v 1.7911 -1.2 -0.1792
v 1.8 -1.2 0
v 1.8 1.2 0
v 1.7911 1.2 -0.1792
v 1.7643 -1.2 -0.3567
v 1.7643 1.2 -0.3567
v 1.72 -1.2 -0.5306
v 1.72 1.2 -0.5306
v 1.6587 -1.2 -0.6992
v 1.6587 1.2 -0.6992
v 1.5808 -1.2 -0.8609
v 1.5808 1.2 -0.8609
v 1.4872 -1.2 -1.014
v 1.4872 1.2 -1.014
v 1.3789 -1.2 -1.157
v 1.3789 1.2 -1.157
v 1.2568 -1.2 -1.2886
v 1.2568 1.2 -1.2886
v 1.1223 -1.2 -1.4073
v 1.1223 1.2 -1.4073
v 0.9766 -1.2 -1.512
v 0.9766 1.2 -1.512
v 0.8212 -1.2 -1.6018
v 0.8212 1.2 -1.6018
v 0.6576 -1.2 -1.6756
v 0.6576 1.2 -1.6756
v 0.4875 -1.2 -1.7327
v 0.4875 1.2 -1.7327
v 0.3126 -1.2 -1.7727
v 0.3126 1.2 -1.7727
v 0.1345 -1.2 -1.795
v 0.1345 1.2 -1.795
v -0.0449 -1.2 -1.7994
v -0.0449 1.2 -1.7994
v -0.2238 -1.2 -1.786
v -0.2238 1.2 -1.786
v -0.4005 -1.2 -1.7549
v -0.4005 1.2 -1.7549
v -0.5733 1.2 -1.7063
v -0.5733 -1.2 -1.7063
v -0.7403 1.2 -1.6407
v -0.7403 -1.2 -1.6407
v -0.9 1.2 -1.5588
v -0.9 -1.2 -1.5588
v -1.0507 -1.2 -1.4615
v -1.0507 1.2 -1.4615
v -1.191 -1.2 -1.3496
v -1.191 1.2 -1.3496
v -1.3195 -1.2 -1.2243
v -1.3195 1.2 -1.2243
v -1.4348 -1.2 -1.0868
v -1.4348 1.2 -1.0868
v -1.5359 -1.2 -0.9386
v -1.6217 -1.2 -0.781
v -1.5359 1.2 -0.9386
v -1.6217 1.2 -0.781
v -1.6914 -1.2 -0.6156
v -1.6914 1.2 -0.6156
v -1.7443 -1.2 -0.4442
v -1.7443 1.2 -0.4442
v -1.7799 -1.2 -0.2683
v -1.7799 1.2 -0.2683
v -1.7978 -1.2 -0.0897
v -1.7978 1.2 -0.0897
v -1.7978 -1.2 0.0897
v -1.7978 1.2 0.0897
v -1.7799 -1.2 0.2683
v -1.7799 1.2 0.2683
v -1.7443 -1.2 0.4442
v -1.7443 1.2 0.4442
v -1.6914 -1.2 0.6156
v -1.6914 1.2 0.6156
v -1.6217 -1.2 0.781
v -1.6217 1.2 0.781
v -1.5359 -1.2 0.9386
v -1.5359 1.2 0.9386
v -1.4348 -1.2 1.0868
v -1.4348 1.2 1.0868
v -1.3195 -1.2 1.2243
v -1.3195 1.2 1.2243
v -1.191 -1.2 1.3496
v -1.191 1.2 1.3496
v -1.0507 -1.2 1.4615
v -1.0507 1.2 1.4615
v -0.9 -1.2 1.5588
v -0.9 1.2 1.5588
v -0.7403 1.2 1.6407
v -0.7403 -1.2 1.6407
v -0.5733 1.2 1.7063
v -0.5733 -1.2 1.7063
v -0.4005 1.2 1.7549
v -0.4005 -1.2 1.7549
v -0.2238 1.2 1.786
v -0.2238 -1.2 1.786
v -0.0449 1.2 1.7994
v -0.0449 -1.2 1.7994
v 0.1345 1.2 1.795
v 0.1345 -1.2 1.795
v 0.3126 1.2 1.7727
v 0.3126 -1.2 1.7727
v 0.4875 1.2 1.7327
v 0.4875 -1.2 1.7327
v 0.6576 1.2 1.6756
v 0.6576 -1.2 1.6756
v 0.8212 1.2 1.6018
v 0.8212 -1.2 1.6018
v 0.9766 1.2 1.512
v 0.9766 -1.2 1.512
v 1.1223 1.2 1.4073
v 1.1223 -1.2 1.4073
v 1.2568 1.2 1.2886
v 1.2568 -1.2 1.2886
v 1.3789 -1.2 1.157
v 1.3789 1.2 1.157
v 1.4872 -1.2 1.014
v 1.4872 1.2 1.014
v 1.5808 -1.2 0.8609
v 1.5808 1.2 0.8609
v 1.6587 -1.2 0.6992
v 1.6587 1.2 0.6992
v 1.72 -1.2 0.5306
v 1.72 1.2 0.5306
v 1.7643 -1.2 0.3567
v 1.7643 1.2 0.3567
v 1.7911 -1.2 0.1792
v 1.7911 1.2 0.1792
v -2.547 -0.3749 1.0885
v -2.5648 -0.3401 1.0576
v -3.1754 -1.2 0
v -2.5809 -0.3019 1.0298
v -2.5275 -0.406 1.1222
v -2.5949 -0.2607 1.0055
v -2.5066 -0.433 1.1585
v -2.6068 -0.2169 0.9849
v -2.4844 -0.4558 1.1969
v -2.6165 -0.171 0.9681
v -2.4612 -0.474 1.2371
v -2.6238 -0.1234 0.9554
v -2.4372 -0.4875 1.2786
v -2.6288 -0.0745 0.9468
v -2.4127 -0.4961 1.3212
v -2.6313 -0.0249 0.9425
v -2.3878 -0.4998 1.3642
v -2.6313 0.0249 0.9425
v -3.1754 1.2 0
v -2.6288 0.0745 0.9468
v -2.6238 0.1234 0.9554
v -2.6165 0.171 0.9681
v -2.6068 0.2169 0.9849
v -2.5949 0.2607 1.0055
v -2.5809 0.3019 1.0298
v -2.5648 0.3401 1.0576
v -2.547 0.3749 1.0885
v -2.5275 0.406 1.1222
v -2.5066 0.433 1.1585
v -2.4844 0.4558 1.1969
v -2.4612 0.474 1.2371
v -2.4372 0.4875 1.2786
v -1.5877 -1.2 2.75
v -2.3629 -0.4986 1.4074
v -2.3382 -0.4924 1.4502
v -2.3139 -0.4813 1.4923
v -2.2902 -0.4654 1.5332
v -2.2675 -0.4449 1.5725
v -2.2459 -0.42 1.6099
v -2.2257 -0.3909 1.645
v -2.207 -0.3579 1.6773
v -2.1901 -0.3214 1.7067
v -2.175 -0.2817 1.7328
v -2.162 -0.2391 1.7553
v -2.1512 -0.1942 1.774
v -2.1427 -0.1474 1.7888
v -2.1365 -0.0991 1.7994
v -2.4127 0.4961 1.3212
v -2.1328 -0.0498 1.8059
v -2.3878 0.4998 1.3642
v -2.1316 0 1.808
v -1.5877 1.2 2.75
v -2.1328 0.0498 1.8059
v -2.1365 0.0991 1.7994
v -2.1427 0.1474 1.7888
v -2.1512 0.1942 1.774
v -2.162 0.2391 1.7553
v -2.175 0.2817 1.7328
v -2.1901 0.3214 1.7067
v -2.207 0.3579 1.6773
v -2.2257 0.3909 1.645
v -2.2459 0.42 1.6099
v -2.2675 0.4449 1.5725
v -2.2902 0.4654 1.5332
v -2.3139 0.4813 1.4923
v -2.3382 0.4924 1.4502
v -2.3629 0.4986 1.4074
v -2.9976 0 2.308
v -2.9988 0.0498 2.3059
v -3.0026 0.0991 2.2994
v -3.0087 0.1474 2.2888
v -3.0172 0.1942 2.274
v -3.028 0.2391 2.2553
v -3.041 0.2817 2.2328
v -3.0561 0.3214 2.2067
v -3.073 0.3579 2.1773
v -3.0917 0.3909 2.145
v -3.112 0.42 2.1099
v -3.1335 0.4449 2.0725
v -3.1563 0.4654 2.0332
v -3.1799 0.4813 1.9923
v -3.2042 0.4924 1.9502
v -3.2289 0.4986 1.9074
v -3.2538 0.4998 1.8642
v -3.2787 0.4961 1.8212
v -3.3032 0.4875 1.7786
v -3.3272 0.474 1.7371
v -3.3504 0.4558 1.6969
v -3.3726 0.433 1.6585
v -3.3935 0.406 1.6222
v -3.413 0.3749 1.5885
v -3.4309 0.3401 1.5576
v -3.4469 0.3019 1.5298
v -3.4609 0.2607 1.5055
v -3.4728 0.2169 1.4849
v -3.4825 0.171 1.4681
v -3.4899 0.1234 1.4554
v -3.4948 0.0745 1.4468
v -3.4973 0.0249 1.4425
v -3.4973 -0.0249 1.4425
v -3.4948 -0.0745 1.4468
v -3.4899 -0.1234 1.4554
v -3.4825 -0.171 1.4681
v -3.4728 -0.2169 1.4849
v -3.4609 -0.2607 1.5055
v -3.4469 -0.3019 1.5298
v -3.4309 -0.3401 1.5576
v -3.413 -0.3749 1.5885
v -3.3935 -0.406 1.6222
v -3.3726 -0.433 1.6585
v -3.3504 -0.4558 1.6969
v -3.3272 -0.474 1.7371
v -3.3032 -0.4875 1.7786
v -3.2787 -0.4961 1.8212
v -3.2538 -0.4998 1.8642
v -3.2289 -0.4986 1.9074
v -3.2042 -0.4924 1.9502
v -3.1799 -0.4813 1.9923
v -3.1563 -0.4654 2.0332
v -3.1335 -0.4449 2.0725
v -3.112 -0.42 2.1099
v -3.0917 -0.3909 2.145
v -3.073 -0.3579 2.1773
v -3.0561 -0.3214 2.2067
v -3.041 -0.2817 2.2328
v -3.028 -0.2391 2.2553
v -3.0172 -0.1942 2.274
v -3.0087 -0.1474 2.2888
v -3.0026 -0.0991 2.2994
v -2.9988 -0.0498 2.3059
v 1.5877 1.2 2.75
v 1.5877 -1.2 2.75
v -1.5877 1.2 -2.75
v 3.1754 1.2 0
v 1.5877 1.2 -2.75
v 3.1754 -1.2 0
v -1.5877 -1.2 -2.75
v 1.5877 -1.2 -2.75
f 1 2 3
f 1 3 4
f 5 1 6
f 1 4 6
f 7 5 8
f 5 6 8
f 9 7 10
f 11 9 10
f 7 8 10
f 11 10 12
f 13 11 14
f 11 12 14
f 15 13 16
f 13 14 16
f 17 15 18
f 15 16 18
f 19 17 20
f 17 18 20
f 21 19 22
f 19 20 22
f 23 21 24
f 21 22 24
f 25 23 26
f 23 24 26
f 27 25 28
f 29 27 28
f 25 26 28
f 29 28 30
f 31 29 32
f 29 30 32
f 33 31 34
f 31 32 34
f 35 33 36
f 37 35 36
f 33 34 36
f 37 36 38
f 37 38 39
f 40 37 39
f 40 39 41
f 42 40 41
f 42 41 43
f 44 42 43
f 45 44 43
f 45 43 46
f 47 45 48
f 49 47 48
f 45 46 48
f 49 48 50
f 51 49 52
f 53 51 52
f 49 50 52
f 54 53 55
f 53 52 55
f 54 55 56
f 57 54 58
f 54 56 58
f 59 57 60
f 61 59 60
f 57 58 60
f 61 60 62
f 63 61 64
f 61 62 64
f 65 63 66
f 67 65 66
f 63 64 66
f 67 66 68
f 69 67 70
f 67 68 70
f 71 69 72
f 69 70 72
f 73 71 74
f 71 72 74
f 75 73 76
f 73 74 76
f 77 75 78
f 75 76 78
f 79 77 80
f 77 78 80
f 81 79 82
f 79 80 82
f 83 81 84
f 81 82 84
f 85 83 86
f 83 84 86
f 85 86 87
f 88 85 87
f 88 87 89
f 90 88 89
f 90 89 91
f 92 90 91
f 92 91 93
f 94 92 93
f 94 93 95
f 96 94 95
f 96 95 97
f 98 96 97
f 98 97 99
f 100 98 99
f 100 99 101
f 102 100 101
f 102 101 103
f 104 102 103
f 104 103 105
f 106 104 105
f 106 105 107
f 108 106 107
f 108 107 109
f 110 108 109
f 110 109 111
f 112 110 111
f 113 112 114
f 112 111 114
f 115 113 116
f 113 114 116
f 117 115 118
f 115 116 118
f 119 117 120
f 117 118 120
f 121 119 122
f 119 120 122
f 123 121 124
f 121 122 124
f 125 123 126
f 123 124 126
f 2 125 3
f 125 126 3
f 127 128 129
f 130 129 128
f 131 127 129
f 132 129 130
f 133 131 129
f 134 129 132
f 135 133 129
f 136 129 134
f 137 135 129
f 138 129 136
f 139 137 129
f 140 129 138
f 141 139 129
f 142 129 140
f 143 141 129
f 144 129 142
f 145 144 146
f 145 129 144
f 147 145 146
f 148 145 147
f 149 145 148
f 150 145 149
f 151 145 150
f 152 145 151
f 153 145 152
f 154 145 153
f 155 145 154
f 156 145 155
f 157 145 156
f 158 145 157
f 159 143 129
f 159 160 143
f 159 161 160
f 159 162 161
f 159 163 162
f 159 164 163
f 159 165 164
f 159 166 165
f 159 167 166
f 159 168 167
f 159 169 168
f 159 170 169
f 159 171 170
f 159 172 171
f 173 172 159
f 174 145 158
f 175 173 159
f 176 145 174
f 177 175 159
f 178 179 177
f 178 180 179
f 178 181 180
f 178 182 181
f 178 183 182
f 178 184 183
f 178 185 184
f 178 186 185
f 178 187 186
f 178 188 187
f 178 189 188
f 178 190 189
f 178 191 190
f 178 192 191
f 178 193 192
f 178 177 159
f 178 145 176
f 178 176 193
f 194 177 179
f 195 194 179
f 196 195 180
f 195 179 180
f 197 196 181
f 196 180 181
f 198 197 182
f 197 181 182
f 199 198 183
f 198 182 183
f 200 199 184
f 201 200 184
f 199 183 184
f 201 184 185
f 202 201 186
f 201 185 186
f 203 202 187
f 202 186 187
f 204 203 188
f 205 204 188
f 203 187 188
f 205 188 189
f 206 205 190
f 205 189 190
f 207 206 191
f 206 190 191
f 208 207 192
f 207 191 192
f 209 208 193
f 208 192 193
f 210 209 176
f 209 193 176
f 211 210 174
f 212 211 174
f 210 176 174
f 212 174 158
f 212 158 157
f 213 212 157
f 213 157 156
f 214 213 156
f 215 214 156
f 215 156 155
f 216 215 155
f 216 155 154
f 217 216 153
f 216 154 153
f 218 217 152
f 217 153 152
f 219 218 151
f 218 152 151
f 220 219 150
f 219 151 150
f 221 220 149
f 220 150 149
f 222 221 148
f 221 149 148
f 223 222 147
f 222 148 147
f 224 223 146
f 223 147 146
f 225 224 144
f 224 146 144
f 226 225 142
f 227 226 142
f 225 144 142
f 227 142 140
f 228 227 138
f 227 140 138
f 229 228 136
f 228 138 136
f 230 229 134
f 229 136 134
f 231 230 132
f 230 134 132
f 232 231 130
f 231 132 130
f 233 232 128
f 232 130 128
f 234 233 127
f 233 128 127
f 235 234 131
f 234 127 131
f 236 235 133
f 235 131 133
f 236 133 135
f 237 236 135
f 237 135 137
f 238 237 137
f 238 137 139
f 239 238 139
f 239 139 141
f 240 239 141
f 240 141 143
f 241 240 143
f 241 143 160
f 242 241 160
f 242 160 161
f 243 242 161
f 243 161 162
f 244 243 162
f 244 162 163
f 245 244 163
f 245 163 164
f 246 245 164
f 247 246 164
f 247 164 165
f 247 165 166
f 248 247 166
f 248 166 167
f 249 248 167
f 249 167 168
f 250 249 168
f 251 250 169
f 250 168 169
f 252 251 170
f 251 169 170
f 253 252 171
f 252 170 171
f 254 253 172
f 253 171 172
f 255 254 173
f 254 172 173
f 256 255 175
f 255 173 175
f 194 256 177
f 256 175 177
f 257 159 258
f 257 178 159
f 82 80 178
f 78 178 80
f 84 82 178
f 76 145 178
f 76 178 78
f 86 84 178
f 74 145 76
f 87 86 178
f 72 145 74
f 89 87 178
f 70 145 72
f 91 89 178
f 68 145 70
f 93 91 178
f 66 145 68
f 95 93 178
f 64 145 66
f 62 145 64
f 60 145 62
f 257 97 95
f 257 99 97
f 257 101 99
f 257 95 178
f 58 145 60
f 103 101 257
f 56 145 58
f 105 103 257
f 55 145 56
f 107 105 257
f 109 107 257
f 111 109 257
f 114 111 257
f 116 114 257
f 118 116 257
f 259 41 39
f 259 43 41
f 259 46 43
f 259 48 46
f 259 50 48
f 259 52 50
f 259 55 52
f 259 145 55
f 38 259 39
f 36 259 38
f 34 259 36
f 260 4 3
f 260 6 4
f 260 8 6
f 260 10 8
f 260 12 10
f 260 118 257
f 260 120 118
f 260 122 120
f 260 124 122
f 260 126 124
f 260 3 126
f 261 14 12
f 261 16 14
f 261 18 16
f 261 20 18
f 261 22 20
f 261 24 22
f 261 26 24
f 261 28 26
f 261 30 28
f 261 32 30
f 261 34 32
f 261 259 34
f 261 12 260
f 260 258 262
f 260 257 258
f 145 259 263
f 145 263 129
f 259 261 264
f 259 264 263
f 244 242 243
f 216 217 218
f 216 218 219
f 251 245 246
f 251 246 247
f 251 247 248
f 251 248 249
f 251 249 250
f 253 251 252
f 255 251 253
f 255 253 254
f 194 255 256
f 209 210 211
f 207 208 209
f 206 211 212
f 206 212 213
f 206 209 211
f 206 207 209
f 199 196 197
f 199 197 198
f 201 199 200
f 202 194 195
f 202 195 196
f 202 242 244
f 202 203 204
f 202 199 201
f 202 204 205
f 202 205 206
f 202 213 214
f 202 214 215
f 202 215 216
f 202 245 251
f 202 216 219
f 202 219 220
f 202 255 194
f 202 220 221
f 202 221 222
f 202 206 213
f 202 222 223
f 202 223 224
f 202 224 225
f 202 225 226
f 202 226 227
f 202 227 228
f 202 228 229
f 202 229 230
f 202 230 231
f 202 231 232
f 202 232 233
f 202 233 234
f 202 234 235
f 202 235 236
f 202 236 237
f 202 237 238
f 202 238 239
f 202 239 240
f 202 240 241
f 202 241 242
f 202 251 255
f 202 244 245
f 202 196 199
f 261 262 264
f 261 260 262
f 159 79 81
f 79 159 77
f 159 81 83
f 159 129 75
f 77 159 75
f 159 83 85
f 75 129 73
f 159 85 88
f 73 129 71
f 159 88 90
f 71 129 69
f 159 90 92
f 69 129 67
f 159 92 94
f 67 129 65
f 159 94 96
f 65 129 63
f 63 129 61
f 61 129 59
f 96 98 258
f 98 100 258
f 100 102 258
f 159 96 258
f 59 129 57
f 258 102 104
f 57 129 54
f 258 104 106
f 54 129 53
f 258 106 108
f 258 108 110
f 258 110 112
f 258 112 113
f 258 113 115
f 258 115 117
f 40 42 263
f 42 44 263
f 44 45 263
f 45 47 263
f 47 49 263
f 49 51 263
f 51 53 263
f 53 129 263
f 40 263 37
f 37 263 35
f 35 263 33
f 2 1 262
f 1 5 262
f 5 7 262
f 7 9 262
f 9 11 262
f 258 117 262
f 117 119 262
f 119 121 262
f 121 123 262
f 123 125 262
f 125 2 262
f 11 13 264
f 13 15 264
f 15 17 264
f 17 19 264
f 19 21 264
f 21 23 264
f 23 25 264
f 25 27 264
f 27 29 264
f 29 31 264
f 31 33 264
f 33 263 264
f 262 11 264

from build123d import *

# Parameters (mm, degrees)
ESTRUSIONE_ESTRUSIONE3_DEPTH = 1.2
SCHIZZO3_R                   = 1.8
TAGLIO_ESTRUSIONE1_DEPTH     = 50
SCHIZZO4_R                   = 0.5
ESTRUSIONE_ESTRUSIONE4_DEPTH = 1


with BuildPart() as part:
    # Schizzo2 → Estrusione-Estrusione3 (new body, symmetric)
    with BuildSketch(Plane(origin=(0, 0, 0), x_dir=(1, 0, 0), z_dir=(0, 1, 0))):
        Polygon((3.175426481, 0), (1.58771324, 2.75), (-1.58771324, 2.75), (-3.175426481, 0), (-1.58771324, -2.75), (1.58771324, -2.75), align=None)
    extrude(amount=ESTRUSIONE_ESTRUSIONE3_DEPTH, both=True)

    # Schizzo3 → Taglio-Estrusione1 (cut, symmetric)
    with BuildSketch(Plane(origin=(0, 1.2, 0), x_dir=(1, 0, 0), z_dir=(0, 1, 0))):
        Circle(SCHIZZO3_R)
    extrude(amount=TAGLIO_ESTRUSIONE1_DEPTH, both=True, mode=Mode.SUBTRACT)

    # Schizzo4 → Estrusione-Estrusione4 (add)
    with BuildSketch(Plane(origin=(-2.38156986, 0, 1.375), x_dir=(0.5, 0, 0.866025404), z_dir=(-0.866025404, 0, 0.5))):
        Circle(SCHIZZO4_R)
    extrude(amount=ESTRUSIONE_ESTRUSIONE4_DEPTH)


solid = part.part
